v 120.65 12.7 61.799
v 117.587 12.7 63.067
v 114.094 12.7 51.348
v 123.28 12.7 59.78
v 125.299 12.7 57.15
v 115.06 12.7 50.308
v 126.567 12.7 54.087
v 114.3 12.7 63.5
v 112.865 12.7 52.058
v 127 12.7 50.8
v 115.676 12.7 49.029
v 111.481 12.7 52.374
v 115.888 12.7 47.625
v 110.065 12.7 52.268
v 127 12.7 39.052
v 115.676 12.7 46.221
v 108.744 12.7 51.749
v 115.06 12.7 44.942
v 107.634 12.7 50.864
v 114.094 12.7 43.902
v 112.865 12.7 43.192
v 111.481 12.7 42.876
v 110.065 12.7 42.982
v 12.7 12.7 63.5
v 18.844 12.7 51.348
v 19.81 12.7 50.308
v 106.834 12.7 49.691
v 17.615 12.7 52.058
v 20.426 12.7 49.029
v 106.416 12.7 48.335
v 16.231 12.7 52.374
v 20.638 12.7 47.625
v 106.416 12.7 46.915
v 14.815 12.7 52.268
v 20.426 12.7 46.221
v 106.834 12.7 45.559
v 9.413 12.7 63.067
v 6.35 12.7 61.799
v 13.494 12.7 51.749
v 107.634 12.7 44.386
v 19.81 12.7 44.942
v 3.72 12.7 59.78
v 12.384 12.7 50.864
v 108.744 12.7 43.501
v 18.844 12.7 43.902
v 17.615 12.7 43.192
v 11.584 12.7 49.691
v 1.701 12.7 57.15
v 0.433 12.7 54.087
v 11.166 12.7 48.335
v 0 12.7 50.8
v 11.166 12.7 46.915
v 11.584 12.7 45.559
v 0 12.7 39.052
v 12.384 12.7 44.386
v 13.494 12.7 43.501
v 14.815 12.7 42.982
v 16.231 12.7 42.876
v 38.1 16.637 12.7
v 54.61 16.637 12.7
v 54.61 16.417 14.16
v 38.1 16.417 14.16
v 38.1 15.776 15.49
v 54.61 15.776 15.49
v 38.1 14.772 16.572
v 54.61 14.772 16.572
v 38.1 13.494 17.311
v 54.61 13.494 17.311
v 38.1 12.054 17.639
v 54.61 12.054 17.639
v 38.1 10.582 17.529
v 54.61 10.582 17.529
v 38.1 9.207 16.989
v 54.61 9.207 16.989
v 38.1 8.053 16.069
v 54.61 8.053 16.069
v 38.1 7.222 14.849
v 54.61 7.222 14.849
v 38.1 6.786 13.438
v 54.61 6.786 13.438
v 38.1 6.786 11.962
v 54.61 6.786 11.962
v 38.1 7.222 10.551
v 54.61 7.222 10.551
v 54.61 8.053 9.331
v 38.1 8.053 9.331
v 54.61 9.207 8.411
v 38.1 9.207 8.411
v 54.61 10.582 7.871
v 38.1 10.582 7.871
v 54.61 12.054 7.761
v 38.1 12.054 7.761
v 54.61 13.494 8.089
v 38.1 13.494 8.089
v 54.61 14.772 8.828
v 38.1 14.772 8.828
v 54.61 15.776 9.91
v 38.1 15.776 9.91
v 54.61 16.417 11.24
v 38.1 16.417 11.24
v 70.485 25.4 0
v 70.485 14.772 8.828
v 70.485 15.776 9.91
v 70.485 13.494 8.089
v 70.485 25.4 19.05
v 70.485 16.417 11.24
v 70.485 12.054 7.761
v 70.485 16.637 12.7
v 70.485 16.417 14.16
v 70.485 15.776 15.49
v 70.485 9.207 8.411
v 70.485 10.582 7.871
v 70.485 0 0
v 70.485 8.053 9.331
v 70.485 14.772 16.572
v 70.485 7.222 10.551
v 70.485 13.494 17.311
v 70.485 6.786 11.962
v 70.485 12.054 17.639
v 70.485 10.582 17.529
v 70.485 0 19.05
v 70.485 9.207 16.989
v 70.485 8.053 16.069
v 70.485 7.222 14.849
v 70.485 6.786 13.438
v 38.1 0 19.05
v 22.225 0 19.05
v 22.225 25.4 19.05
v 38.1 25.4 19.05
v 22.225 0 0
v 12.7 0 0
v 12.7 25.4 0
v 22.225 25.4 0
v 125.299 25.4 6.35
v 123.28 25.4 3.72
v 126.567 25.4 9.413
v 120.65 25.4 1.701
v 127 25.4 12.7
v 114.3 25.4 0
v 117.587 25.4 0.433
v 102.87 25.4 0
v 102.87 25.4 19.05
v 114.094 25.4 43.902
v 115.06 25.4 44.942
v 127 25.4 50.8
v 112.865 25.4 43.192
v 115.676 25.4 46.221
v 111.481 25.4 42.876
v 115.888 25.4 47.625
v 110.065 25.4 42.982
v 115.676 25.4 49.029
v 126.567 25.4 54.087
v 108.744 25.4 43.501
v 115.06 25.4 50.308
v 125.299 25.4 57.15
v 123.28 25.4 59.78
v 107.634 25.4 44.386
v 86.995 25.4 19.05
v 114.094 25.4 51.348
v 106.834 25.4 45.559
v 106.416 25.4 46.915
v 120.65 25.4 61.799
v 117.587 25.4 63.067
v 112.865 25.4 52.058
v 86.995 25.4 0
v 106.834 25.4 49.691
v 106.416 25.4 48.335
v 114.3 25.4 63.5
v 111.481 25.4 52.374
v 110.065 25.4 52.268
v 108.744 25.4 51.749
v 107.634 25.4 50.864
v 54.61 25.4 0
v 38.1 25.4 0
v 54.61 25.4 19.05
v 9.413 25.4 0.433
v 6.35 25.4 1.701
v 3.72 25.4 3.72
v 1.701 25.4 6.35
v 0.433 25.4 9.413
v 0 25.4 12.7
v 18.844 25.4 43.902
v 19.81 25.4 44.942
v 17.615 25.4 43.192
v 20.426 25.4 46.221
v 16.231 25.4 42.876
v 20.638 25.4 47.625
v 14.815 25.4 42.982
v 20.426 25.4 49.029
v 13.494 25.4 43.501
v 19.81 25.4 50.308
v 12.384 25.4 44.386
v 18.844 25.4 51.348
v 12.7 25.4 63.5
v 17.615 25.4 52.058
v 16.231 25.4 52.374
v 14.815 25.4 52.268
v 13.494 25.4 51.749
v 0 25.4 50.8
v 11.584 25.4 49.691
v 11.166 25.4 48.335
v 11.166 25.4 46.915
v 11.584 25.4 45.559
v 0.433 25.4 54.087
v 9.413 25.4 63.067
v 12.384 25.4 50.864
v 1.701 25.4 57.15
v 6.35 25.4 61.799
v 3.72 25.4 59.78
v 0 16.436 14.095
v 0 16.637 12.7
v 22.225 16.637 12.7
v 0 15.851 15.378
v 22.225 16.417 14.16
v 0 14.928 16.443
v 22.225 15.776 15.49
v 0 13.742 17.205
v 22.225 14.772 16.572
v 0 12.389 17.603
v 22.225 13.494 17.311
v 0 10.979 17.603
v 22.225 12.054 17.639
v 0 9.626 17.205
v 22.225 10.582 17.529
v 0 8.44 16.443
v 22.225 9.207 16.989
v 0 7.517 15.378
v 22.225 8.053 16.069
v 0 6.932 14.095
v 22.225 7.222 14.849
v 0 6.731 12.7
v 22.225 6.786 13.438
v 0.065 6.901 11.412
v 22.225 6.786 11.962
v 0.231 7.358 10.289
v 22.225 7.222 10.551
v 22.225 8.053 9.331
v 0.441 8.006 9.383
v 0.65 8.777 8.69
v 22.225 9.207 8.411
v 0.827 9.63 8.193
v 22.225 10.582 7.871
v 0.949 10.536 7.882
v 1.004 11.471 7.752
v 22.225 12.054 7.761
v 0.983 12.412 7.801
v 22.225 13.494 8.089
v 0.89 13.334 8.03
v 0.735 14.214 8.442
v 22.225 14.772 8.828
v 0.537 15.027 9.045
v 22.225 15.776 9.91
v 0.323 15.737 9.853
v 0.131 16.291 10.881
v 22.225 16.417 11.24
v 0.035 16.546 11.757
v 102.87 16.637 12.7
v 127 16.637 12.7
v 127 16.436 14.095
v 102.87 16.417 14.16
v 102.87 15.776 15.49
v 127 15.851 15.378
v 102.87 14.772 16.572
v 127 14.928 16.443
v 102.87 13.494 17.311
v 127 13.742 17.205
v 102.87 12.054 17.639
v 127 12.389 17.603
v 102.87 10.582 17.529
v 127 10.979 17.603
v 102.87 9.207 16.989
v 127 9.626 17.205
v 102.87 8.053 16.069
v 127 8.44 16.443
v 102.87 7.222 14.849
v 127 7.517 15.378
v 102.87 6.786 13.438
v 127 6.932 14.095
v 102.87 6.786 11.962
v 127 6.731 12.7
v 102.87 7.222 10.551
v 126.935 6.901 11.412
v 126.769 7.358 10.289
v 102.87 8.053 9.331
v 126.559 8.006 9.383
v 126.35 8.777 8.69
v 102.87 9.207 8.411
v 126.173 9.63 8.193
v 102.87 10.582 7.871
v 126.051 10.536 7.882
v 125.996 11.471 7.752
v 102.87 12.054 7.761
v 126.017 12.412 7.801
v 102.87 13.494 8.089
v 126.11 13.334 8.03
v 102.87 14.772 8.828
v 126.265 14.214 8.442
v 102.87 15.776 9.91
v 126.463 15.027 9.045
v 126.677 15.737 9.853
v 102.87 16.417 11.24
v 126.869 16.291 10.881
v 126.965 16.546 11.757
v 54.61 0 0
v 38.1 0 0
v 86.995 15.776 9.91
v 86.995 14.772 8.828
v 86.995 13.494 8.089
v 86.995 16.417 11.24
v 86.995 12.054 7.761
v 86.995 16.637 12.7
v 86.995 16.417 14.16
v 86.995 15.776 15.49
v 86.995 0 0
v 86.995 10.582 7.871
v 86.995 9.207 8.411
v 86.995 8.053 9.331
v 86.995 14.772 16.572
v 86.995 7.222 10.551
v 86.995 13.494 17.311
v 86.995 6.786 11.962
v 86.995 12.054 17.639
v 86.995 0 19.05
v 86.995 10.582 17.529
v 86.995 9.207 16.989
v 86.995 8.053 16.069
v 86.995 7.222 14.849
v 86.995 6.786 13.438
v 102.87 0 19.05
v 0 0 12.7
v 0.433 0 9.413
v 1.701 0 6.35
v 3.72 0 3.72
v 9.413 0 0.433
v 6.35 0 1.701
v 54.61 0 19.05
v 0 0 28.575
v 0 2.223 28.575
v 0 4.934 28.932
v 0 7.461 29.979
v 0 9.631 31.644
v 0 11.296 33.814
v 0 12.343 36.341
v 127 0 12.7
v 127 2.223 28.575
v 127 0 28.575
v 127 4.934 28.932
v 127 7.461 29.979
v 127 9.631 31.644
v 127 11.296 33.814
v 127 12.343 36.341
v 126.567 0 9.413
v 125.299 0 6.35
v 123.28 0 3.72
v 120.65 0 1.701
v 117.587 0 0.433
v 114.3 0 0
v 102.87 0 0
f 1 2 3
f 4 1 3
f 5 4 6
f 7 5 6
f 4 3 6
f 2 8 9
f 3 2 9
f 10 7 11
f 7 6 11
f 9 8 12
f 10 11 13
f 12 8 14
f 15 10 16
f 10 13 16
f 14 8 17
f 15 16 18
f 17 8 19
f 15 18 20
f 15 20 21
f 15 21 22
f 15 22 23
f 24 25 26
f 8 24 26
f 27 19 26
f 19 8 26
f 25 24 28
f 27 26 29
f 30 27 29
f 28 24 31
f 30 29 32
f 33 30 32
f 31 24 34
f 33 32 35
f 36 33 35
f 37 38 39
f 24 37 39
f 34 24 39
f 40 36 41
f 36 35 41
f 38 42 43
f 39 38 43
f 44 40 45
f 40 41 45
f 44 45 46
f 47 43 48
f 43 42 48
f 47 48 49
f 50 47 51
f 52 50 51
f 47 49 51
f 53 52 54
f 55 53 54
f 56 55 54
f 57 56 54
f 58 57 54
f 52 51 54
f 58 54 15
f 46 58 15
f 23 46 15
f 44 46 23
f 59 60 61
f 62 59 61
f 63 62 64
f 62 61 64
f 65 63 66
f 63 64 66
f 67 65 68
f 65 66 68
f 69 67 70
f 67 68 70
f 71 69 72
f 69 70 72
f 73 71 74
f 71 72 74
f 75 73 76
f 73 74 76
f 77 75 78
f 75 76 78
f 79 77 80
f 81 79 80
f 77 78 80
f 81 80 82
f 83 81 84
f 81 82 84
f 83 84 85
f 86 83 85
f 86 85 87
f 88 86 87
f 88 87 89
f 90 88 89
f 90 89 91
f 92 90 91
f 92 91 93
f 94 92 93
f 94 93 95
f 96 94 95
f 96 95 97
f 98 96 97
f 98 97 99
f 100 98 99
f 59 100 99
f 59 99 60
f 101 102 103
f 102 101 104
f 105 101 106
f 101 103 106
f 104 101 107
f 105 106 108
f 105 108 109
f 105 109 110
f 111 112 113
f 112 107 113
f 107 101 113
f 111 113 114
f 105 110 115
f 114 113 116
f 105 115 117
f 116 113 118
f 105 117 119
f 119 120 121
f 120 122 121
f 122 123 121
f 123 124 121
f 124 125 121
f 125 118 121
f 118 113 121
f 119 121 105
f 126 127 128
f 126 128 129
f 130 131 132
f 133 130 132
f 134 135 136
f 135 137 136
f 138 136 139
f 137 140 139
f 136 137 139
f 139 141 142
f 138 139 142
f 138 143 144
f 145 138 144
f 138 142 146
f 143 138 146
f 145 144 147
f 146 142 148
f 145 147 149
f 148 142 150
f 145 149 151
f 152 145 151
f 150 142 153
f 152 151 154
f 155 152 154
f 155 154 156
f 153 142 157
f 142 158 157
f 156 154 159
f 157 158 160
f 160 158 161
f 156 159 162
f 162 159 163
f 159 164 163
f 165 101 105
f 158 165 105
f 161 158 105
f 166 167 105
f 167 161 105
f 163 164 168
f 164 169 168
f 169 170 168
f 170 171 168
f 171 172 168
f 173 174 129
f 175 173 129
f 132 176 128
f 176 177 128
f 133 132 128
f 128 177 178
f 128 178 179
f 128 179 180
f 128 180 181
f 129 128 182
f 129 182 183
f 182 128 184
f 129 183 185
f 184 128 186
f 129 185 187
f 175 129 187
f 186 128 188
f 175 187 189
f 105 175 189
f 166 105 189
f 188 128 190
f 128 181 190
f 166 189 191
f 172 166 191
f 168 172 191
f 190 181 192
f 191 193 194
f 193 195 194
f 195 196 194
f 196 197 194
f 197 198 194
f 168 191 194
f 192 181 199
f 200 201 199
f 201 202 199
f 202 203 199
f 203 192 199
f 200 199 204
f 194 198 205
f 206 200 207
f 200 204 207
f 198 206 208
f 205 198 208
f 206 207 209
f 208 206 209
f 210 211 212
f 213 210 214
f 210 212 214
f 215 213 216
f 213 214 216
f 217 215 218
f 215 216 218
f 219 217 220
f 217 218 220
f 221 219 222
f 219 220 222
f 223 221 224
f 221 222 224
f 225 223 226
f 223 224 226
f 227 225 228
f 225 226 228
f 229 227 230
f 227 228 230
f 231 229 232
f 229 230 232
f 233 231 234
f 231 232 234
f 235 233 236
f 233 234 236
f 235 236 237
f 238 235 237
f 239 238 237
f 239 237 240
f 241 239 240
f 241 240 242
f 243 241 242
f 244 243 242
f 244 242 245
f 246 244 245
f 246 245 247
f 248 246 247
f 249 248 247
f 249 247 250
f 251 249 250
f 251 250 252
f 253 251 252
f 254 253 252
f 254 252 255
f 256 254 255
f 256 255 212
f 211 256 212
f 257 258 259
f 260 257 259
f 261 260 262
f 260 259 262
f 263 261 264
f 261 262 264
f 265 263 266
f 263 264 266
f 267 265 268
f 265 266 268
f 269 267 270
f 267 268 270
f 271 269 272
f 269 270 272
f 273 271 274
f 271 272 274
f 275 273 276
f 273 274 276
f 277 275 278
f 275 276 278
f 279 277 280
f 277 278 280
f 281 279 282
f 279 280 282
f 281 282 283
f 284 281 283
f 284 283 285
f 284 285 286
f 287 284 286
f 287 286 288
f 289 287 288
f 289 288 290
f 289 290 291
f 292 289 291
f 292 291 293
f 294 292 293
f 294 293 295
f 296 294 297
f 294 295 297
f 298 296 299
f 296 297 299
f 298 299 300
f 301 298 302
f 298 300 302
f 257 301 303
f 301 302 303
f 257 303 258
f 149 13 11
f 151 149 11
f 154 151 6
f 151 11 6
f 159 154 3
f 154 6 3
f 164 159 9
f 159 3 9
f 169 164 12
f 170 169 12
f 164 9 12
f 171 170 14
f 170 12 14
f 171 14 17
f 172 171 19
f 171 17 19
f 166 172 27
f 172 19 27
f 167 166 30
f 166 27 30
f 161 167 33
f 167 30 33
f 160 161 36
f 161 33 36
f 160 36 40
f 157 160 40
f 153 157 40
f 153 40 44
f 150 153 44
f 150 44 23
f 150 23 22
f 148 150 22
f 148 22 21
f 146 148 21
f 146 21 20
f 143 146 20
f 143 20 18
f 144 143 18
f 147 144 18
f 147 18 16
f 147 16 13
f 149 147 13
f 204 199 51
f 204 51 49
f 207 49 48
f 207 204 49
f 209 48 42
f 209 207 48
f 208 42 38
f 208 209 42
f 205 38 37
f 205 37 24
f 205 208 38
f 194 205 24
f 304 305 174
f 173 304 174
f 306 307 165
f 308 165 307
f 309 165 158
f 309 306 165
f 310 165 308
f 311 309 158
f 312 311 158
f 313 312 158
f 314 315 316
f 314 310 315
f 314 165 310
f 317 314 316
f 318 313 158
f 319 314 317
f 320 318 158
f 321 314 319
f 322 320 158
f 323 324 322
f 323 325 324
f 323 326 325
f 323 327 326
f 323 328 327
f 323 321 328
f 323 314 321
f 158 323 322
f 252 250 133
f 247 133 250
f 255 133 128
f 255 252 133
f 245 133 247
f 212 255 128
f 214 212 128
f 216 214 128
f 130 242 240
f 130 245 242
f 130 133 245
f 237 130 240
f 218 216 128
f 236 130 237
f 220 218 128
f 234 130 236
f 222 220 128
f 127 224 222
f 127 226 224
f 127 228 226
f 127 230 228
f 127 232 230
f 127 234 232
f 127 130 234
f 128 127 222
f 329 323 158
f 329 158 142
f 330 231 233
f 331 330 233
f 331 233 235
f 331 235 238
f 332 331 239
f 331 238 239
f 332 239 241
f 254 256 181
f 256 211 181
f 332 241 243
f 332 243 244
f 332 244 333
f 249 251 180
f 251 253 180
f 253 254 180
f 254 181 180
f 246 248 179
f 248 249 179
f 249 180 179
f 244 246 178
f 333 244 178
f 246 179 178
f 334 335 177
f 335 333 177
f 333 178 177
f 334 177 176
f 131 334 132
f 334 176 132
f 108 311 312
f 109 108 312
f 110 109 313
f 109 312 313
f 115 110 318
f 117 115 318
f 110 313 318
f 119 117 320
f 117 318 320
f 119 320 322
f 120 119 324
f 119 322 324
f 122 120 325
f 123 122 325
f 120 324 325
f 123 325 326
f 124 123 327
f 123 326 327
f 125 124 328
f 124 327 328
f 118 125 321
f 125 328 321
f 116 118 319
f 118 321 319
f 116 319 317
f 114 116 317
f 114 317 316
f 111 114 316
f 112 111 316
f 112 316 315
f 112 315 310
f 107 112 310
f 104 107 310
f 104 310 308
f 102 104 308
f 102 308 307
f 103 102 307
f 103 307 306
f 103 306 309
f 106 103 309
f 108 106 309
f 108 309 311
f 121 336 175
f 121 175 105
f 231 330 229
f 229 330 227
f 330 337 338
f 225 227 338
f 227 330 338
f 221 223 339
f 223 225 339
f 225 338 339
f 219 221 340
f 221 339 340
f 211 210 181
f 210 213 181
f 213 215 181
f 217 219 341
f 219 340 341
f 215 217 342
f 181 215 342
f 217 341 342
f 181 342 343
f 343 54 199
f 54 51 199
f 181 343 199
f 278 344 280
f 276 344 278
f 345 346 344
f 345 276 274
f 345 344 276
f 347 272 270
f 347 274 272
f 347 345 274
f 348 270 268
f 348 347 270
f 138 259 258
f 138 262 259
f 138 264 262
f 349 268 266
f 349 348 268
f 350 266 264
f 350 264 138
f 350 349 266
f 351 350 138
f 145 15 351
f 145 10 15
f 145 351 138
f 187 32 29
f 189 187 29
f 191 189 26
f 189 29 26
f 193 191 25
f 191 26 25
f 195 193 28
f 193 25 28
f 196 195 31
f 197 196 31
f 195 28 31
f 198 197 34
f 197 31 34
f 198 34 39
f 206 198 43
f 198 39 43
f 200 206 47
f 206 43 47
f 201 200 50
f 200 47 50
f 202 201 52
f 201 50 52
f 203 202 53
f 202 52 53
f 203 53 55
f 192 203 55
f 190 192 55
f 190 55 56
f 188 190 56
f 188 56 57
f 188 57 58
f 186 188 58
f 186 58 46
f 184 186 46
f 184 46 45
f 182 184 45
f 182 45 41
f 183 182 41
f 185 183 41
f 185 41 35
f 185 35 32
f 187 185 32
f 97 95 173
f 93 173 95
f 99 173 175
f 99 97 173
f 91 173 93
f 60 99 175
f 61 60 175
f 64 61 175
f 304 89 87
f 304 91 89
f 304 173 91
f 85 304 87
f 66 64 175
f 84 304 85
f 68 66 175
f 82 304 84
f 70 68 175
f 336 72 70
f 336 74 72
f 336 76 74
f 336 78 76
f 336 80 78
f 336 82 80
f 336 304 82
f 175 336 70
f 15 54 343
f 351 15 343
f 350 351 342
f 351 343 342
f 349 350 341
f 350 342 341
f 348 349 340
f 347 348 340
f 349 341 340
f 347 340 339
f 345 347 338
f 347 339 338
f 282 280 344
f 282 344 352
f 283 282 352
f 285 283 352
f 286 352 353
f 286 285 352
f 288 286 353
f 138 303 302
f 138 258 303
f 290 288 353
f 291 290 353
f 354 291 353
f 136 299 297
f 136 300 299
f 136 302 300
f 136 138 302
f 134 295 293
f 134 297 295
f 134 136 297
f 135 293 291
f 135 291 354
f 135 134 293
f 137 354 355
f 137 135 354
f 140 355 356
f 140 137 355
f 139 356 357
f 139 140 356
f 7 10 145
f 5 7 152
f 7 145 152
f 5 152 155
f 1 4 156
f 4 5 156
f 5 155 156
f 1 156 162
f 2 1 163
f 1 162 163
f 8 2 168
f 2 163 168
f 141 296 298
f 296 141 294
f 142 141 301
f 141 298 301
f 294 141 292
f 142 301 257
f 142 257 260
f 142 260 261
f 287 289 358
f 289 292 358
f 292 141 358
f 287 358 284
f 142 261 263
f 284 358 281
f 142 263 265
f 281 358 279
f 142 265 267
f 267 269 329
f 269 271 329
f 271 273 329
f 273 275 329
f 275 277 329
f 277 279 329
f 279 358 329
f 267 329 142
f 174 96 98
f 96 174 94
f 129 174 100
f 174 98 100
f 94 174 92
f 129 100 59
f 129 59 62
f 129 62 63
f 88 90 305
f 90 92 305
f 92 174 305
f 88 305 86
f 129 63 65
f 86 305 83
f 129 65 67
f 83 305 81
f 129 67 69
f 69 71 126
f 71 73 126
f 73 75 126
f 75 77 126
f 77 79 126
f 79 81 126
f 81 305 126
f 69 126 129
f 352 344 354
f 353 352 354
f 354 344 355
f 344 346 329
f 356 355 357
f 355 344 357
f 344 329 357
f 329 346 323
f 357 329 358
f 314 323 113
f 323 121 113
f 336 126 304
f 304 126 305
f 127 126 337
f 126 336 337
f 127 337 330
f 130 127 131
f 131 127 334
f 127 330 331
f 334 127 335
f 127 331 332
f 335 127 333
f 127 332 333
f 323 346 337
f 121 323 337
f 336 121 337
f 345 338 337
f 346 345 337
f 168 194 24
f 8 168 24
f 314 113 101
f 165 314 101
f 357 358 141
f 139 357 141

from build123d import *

# Parameters (mm, degrees)
F1_DEPTH    = 127
F2_R        = 4.7625
F3_DEPTH    = 25.4
F4_W        = 15.875
F4_H        = 19.05
F5_DEPTH    = 25.401
F6_R        = 4.953
F7_DEPTH    = 127.001
F8_T1_DEPTH = 76.2
F8_T3_DEPTH = 88.9


# Not quite as in the source:
# - a fillet or chamfer that OpenCascade refuses, or shapes differently, is made with other operations: its cross-section is extruded or revolved along the edge and cut away or added


with BuildPart() as f1:
    # F0 (on Right) → F1 (new body)
    with BuildSketch(Plane.YZ):
        with BuildLine():
            Line((0, 28.575), (0, 0))
            Line((0, 0), (25.4, 0))
            Line((25.4, 0), (25.4, 63.5))
            Line((25.4, 63.5), (12.7, 63.5))
            Line((12.7, 63.5), (12.7, 39.0525))
            ThreePointArc((12.7, 39.0525), (9.6312112999, 31.6437887001), (2.2225, 28.575))
            Line((2.2225, 28.575), (0, 28.575))
        make_face()
    extrude(amount=F1_DEPTH)

    # F2 (on face) → F3 (cut)
    with BuildSketch(Plane.XZ.offset(-12.7)):
        with Locations((111.125, 47.625)):
            Circle(F2_R)
        with Locations((15.875, 47.625)):
            Circle(F2_R)
    extrude(amount=-F3_DEPTH, mode=Mode.SUBTRACT)

    # F4 (on face) → F5 (cut, through all)
    with BuildSketch(Plane.XZ):
        with Locations((94.9325, 9.525)):
            Rectangle(F4_W, F4_H)
        with Locations((62.5475, 9.525)):
            Rectangle(F4_W, F4_H)
        with Locations((30.1625, 9.525)):
            Rectangle(F4_W, F4_H)
    extrude(amount=-F5_DEPTH, mode=Mode.SUBTRACT)

    # F6 (on face) → F7 (cut, through all)
    with BuildSketch(Plane.YZ.offset(127)):
        with Locations((11.684, 12.7)):
            Circle(F6_R)
    extrude(amount=-F7_DEPTH, mode=Mode.SUBTRACT)

    # F8: fillet of radius 12.7 on 4 edges, made by hand

    # F8_s2 → F8_t1 (cut)
    with BuildSketch(Plane.XZ.offset(-57.15)):
        with BuildLine():
            ThreePointArc((0, 50.8), (3.7197438789, 59.7802561211), (12.7, 63.5))
            Line((12.7, 63.5), (0, 63.5))
            Line((0, 63.5), (0, 50.8))
        make_face()
        with BuildLine():
            ThreePointArc((127, 50.8), (123.2802561211, 59.7802561211), (114.3, 63.5))
            Line((114.3, 63.5), (127, 63.5))
            Line((127, 63.5), (127, 50.8))
        make_face()
    extrude(amount=F8_T1_DEPTH, mode=Mode.SUBTRACT)

    # F8_s4 → F8_t3 (cut)
    with BuildSketch(Plane.XZ.offset(-57.15)):
        with BuildLine():
            ThreePointArc((0, 12.7), (3.7197438789, 3.7197438789), (12.7, 0))
            Line((12.7, 0), (0, 0))
            Line((0, 0), (0, 12.7))
        make_face()
        with BuildLine():
            ThreePointArc((127, 12.7), (123.2802561211, 3.7197438789), (114.3, 0))
            Line((114.3, 0), (127, 0))
            Line((127, 0), (127, 12.7))
        make_face()
    extrude(amount=F8_T3_DEPTH, mode=Mode.SUBTRACT)


solid = f1.part
